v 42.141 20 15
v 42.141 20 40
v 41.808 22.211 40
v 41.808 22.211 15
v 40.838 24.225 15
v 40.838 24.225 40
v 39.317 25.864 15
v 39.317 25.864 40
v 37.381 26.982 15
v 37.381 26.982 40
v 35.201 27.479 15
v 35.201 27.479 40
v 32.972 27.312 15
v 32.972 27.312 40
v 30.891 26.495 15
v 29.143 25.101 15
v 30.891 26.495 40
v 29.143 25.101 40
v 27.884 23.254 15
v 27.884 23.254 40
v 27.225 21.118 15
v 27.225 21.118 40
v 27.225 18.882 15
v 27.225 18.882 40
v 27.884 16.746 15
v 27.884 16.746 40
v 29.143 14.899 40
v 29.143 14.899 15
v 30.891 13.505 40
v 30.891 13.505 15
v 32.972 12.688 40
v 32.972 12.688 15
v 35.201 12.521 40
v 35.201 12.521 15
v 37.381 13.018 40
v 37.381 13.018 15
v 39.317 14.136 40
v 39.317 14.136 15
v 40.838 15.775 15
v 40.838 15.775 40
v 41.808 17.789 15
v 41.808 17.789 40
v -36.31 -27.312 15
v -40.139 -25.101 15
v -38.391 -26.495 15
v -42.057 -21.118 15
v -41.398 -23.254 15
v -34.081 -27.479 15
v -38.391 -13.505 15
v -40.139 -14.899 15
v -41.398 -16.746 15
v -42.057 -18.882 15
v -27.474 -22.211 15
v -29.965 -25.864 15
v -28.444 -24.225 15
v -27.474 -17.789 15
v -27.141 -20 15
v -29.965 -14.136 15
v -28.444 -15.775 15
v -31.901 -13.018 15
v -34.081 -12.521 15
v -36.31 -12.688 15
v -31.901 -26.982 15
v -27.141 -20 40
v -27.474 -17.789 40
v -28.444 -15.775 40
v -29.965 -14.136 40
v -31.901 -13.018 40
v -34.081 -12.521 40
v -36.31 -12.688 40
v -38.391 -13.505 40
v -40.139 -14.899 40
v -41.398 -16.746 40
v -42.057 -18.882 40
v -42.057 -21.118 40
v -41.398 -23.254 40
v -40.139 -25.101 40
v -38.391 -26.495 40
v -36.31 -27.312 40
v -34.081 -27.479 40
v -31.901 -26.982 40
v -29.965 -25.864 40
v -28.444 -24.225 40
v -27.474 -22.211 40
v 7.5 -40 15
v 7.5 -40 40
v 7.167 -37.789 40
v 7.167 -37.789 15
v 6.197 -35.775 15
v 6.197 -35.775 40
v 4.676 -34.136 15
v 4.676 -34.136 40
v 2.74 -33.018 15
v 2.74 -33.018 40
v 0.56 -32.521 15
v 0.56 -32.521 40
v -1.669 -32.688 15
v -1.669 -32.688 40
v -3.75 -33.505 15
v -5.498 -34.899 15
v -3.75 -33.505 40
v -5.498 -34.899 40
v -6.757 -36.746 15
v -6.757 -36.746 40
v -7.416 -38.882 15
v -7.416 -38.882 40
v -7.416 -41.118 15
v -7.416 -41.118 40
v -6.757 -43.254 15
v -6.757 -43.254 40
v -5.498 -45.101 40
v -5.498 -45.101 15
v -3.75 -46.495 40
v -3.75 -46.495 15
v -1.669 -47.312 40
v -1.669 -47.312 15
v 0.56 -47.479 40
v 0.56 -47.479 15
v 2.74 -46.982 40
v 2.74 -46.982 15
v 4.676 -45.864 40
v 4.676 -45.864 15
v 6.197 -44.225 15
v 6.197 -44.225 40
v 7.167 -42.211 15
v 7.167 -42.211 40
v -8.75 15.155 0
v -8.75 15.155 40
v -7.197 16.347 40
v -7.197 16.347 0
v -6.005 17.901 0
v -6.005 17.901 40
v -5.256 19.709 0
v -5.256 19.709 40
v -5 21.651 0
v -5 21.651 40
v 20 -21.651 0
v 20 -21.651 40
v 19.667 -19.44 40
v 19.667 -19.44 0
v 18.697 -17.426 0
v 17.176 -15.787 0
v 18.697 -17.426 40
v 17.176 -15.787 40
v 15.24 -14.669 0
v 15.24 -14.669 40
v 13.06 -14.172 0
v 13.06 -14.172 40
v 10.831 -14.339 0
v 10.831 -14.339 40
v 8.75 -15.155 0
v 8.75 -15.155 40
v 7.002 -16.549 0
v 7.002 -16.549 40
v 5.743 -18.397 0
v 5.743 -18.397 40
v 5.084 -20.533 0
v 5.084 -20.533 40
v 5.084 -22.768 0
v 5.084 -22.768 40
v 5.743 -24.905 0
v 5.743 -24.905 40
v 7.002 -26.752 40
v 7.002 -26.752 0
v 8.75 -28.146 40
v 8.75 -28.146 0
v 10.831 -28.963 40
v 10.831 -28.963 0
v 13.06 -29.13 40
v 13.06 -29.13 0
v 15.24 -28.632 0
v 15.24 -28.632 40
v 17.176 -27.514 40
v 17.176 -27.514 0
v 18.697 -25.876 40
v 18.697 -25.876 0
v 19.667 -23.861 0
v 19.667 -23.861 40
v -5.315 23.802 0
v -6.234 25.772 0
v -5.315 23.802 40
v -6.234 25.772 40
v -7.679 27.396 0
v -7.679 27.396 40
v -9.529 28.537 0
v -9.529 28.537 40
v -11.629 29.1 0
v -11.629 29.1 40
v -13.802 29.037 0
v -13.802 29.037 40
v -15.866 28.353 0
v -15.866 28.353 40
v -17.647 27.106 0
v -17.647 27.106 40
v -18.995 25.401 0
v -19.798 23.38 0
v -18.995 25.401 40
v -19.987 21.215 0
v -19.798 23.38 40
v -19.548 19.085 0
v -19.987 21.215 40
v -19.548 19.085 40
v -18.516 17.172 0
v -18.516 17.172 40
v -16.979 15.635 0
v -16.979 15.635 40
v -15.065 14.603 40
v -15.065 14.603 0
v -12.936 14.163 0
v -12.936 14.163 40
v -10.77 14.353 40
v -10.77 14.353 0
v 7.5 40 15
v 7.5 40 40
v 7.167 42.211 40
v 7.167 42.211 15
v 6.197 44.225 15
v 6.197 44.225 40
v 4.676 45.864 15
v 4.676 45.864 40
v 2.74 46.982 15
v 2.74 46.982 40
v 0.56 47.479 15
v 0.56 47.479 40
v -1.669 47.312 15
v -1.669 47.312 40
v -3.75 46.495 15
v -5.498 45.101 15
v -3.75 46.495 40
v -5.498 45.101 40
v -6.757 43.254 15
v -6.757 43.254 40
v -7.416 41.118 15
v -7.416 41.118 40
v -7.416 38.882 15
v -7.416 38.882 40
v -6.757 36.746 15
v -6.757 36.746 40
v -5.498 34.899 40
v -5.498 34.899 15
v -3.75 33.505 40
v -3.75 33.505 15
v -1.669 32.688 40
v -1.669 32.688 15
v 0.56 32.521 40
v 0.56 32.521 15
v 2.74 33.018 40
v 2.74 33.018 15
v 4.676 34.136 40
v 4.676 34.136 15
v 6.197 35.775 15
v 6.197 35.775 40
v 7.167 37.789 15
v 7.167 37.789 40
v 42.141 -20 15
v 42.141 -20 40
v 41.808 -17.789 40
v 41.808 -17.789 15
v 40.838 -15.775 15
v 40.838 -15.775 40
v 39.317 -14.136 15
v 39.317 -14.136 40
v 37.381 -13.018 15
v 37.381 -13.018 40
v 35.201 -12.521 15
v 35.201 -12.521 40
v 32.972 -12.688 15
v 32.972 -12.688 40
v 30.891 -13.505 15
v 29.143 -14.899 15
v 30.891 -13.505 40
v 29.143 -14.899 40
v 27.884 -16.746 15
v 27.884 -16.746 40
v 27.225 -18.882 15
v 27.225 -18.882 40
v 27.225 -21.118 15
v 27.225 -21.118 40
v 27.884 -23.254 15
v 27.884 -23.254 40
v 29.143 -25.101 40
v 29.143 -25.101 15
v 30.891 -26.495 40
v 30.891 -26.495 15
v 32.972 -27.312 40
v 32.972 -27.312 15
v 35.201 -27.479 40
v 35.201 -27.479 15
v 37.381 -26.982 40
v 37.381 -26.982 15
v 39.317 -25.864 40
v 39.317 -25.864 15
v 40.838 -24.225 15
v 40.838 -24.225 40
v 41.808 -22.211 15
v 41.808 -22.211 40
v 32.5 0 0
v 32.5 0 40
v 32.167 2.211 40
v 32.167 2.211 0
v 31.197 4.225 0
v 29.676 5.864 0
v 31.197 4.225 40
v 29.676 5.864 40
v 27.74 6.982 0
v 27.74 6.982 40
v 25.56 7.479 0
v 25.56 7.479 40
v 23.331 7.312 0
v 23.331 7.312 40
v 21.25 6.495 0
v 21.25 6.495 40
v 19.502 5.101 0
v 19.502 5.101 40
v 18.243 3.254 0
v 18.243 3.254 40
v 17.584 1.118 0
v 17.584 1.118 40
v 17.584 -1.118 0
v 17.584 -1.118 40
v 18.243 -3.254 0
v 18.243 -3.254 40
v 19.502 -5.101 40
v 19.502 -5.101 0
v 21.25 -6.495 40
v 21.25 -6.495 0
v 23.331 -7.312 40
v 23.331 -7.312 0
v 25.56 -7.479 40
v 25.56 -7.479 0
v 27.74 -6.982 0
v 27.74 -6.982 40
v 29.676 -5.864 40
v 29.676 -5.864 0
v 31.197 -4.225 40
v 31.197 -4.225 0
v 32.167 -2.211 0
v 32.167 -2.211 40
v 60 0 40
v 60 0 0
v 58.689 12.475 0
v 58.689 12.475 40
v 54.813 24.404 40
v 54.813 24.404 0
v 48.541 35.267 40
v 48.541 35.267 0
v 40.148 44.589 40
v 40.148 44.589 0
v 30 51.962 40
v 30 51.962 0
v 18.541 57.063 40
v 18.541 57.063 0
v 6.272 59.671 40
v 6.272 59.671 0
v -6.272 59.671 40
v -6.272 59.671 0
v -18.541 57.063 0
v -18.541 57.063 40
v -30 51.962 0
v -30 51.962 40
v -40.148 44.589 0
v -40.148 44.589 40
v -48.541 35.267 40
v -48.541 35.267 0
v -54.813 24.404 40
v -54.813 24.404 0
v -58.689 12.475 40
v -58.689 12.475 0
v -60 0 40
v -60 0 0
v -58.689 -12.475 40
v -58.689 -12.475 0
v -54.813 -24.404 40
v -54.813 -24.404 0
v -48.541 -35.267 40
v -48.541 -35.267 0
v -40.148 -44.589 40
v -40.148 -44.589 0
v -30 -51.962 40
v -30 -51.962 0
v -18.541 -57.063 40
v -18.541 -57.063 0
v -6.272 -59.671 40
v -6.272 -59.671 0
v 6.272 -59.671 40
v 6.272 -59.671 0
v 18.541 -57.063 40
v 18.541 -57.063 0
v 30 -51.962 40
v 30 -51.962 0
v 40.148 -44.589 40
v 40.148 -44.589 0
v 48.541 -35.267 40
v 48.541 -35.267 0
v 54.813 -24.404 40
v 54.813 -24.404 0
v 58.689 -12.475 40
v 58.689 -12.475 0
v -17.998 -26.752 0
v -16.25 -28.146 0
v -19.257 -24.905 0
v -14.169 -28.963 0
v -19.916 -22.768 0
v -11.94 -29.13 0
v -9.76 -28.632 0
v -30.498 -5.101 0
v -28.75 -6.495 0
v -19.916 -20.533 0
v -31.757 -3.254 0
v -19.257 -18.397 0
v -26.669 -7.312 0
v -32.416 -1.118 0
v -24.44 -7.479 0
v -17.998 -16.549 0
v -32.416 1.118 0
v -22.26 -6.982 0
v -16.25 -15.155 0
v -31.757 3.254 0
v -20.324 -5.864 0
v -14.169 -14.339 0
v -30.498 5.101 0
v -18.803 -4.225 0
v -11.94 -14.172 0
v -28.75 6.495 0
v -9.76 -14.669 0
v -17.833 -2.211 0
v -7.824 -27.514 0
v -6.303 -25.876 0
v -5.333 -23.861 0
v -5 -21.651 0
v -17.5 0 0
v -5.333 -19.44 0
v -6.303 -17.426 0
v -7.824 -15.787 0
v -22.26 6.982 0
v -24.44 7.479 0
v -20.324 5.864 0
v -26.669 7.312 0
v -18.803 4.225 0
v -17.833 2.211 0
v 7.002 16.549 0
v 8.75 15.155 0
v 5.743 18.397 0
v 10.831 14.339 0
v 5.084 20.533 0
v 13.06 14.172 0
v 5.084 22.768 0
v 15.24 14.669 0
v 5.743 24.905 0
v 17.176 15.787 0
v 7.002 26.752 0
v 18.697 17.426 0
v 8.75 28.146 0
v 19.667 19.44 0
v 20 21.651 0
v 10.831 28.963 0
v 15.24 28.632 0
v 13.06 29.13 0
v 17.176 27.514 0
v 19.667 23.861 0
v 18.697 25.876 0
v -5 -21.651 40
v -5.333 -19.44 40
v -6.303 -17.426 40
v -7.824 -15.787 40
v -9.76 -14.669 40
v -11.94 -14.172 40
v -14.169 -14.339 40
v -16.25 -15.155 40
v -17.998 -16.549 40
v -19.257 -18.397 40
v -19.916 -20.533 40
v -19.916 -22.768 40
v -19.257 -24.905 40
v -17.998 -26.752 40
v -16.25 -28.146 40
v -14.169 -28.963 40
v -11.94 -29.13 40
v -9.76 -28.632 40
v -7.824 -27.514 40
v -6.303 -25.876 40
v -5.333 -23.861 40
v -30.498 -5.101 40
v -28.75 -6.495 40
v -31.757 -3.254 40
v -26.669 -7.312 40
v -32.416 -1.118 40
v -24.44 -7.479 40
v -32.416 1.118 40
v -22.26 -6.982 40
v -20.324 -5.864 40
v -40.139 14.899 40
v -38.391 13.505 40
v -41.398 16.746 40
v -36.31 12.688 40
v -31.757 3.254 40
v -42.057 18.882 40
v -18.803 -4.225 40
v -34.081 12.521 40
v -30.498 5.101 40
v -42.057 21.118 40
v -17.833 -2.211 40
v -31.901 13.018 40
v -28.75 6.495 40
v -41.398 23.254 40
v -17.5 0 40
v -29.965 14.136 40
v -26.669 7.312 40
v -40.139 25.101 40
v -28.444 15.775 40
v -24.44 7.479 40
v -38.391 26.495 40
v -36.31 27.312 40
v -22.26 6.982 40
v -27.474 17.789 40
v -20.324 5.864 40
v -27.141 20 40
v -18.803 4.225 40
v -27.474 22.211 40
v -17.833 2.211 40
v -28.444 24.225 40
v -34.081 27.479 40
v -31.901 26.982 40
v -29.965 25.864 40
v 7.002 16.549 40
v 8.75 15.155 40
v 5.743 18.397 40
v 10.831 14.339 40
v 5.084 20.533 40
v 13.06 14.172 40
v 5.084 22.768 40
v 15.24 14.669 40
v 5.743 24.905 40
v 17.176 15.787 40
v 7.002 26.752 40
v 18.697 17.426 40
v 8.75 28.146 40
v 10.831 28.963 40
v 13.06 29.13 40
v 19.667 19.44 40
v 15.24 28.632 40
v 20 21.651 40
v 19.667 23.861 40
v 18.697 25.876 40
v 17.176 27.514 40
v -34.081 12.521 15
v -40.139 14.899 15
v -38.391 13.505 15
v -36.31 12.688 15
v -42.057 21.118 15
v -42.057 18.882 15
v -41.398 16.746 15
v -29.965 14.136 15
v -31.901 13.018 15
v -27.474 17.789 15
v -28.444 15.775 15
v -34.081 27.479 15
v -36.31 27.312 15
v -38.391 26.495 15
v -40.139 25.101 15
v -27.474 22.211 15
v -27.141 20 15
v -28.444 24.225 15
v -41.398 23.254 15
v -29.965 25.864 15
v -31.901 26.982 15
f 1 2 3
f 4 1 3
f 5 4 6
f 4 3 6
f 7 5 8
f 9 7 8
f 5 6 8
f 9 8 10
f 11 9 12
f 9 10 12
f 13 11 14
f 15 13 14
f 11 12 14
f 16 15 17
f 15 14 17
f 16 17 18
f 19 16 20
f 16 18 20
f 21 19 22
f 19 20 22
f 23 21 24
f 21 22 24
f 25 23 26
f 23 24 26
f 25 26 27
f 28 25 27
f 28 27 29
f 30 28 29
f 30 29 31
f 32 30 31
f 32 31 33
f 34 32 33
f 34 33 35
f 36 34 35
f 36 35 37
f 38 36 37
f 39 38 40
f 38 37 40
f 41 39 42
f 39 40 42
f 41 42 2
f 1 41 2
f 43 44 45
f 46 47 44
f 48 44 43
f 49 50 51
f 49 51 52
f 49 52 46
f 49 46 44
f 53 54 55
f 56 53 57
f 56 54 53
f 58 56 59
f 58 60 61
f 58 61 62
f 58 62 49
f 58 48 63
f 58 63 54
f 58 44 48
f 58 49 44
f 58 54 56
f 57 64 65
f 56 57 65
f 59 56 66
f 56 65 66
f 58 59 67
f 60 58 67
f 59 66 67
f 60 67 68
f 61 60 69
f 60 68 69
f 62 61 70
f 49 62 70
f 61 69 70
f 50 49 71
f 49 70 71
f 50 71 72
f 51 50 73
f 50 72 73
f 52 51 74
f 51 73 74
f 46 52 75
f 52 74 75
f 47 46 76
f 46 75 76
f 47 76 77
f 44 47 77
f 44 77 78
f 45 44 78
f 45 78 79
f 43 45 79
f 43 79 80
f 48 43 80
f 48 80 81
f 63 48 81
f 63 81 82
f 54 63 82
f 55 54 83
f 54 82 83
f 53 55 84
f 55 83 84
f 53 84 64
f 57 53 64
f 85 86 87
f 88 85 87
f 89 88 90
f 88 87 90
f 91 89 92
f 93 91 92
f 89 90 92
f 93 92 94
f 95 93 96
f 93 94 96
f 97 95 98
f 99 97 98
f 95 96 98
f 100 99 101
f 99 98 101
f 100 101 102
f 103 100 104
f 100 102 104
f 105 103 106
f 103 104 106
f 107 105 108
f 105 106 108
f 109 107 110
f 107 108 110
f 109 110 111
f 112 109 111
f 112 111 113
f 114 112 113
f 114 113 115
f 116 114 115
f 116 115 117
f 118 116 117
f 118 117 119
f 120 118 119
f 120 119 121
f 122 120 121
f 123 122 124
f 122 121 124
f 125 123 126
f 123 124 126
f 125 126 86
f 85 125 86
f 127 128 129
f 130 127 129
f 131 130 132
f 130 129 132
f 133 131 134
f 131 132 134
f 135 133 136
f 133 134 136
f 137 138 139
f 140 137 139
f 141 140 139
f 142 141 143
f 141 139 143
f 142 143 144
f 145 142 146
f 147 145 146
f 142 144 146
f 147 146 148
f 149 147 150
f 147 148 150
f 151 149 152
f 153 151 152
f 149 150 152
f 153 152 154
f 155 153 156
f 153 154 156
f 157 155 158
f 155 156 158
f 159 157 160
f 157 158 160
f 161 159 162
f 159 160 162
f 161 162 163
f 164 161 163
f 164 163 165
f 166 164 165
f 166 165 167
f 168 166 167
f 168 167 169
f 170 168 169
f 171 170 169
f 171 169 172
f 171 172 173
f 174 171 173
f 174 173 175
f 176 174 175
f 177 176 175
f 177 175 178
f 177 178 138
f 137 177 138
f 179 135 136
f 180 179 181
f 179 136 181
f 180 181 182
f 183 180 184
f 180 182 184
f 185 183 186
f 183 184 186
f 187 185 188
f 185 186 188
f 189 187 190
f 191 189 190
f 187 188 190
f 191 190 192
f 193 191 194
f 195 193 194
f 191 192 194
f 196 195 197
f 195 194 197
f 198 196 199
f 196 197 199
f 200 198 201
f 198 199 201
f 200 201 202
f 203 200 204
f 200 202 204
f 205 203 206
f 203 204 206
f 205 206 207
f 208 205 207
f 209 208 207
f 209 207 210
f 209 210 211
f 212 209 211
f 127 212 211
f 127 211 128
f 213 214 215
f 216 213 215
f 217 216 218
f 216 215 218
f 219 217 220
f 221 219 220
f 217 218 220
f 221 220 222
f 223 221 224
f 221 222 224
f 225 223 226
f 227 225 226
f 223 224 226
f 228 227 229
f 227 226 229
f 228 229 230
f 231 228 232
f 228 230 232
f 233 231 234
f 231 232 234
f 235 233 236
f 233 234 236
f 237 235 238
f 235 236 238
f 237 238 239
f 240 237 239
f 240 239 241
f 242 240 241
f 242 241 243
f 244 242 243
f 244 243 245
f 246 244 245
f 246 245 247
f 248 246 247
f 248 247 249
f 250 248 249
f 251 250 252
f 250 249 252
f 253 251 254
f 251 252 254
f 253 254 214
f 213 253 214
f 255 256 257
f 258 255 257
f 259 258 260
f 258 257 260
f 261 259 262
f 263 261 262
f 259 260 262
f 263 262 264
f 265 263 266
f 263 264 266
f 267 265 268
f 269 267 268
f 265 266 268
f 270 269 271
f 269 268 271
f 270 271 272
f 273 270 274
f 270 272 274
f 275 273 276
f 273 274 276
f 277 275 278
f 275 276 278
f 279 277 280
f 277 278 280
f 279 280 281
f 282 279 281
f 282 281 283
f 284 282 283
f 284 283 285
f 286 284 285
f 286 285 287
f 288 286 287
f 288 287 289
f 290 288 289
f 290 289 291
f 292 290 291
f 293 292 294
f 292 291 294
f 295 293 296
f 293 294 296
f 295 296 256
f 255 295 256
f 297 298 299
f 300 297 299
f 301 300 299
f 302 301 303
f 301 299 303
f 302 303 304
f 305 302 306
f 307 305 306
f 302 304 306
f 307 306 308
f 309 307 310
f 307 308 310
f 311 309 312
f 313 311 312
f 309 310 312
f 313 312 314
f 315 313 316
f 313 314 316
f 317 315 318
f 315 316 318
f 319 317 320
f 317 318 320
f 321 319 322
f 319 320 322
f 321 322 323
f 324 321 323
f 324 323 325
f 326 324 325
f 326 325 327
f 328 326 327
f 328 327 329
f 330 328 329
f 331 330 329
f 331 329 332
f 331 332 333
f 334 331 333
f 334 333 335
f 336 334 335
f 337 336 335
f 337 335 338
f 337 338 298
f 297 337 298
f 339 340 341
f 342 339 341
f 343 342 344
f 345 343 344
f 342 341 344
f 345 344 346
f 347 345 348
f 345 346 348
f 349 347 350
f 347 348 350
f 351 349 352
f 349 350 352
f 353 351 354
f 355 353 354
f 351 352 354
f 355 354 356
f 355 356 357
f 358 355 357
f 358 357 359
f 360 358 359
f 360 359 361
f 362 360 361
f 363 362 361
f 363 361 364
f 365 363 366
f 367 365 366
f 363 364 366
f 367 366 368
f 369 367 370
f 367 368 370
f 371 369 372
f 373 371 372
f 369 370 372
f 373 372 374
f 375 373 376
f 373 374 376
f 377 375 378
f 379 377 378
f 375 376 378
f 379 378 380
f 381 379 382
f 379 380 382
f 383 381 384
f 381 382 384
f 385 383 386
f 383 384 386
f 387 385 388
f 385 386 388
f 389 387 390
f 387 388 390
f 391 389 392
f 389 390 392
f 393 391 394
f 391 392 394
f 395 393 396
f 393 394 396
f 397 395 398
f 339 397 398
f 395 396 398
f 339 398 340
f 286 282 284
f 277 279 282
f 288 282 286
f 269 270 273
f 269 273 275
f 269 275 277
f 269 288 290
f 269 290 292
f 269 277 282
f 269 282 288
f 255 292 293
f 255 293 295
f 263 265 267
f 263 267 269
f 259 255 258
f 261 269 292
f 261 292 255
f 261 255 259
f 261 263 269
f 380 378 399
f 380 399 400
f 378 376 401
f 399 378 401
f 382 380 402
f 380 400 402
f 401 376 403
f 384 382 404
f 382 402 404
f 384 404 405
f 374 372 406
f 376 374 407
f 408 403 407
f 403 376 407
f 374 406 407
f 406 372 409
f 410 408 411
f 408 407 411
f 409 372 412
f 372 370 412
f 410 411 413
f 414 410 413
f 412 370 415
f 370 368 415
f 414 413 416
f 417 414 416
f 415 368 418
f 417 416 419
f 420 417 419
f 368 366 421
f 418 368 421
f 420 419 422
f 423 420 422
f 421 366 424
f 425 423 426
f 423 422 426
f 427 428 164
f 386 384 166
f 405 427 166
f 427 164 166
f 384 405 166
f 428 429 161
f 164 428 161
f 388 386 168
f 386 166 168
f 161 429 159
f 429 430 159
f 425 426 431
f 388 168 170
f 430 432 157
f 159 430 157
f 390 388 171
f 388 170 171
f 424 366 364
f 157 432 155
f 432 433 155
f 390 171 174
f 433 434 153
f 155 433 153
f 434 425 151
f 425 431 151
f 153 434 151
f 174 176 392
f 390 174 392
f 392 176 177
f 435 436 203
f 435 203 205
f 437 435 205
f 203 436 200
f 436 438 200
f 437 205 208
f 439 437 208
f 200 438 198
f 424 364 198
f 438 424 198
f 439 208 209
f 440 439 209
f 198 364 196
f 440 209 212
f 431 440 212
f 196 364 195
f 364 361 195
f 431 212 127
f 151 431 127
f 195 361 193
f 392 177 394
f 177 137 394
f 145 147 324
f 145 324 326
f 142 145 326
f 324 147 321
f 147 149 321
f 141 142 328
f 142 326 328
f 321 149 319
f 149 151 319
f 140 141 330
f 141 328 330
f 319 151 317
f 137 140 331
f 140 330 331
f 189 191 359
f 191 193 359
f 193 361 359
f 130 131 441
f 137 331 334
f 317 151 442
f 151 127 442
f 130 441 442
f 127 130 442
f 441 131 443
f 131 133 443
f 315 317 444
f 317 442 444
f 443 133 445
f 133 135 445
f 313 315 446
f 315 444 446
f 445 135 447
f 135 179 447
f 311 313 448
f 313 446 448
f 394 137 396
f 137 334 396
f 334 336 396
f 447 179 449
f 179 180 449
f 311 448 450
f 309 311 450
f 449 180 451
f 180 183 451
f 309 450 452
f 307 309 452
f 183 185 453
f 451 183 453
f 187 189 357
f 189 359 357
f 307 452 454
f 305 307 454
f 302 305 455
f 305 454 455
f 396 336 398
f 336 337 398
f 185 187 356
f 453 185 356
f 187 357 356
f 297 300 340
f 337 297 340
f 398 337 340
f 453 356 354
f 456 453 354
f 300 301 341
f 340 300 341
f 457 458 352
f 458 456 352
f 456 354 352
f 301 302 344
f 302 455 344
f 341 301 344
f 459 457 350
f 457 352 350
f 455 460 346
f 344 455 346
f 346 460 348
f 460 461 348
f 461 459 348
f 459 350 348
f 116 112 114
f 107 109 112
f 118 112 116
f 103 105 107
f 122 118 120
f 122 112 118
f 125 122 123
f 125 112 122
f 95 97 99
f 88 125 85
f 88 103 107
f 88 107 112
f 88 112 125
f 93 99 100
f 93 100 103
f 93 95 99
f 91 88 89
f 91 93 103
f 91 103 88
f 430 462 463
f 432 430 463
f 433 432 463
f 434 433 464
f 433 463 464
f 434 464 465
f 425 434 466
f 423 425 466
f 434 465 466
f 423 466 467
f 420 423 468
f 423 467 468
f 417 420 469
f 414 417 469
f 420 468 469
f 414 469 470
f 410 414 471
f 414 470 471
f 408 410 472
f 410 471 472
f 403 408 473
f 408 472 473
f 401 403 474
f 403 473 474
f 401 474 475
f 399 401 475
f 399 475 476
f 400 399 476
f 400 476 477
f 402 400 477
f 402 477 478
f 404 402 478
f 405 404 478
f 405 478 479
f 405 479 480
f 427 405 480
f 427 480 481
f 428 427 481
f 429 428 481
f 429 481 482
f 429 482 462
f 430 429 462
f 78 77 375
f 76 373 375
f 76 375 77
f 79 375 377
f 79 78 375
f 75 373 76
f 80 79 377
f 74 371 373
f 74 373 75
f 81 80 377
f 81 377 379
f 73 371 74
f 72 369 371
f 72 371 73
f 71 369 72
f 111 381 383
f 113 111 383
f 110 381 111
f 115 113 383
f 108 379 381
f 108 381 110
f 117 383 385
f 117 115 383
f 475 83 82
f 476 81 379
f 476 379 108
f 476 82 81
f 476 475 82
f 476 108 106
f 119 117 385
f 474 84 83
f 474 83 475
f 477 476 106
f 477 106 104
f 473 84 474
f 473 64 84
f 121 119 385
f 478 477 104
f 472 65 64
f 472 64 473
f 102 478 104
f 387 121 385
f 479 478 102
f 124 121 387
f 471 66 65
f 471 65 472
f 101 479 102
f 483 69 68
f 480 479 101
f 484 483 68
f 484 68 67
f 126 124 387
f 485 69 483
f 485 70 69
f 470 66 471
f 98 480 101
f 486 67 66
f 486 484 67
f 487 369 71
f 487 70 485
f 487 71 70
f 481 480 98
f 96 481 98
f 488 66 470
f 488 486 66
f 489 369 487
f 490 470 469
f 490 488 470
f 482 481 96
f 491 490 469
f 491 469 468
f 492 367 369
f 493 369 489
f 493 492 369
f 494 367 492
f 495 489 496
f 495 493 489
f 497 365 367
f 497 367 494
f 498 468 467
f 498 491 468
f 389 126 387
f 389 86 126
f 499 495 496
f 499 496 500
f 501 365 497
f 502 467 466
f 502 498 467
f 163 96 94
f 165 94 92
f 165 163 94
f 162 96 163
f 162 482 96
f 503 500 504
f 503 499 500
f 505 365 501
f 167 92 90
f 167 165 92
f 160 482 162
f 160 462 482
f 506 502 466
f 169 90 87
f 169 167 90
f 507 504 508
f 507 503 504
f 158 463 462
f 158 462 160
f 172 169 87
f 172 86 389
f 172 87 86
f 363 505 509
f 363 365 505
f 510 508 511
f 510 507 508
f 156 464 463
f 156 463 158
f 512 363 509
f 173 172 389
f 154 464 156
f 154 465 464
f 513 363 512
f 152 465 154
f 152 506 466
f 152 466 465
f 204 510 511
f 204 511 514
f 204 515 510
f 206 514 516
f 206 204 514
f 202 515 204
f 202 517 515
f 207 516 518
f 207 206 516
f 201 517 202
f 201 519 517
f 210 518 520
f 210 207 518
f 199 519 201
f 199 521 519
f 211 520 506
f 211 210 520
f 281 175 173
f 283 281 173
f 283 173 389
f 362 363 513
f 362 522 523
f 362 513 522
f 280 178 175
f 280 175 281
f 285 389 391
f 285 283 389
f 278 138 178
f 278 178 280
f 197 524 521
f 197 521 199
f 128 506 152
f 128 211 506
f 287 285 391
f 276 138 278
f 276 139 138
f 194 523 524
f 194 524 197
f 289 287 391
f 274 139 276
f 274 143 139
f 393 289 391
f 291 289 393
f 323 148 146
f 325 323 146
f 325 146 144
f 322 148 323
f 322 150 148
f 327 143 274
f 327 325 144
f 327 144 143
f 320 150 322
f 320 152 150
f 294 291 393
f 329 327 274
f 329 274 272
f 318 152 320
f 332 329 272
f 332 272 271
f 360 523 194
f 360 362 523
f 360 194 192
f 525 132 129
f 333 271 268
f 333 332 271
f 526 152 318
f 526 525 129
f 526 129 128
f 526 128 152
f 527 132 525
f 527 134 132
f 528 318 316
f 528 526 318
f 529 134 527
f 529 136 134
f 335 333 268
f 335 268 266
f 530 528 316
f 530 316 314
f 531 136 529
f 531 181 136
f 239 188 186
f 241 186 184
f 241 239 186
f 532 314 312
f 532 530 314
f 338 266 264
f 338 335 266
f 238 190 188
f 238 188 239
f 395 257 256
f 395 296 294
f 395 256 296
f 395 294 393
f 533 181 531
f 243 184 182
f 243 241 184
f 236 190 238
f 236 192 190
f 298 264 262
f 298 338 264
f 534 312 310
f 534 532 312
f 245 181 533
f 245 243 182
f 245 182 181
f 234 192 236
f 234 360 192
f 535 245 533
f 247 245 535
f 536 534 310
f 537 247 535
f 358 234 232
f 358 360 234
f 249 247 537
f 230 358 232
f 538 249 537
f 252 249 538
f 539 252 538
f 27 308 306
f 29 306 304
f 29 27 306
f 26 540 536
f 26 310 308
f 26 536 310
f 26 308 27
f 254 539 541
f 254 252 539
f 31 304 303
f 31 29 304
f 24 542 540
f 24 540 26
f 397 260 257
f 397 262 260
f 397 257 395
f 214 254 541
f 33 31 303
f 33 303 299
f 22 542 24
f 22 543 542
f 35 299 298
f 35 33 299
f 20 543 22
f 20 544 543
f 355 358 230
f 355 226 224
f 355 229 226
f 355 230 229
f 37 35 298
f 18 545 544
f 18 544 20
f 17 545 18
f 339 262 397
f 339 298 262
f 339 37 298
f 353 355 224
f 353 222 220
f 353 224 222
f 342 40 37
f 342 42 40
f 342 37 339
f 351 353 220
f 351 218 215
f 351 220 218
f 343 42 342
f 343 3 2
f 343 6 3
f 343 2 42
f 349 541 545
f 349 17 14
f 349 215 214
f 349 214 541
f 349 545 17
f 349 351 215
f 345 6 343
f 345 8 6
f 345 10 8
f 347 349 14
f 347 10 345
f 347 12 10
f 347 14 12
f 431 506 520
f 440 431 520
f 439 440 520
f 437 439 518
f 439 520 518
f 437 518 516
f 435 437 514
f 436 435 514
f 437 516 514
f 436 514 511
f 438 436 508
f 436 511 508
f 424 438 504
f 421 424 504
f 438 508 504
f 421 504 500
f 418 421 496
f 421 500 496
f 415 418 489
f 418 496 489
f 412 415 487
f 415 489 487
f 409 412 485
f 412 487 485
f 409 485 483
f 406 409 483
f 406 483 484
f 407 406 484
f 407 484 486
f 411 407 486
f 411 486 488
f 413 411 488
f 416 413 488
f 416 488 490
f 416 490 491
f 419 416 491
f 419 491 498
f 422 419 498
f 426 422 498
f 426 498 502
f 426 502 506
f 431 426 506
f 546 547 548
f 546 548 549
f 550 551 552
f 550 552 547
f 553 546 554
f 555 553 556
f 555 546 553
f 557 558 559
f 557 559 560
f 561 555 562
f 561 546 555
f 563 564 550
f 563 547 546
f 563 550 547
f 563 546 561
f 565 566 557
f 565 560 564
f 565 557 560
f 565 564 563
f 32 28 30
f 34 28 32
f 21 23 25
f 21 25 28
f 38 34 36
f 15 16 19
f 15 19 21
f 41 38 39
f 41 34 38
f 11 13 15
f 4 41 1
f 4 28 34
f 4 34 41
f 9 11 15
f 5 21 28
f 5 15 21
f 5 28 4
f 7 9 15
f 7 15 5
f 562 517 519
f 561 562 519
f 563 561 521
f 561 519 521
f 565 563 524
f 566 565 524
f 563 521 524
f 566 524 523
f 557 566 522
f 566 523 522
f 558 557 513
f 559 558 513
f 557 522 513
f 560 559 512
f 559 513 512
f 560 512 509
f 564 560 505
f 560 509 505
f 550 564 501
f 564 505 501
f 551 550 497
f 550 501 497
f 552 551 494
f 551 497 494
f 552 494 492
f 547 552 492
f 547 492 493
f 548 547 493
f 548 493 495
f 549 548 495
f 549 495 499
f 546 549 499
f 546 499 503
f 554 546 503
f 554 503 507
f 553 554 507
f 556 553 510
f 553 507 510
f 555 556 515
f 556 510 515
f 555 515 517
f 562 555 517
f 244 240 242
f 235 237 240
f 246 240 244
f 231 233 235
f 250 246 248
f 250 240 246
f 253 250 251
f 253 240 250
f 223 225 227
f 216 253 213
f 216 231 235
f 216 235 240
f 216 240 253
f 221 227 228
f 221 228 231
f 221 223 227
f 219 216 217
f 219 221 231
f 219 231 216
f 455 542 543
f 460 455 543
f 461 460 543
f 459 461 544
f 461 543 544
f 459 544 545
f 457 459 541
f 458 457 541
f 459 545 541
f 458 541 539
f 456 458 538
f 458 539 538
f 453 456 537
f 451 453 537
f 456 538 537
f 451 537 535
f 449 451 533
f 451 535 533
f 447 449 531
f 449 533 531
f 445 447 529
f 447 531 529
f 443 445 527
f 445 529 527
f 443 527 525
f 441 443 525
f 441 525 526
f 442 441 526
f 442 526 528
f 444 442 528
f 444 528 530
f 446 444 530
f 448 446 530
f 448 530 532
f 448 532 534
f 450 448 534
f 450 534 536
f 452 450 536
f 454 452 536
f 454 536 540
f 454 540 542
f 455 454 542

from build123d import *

# Parameters (mm, degrees)
F0_R     = 60
F1_DEPTH = 40
F2_R     = 7.5
F3_DEPTH = 25
F4_R     = 7.5
F5_DEPTH = 40.001


# Not quite as in the source:
# - a feature names something its author has since deleted; it is built from what else it names


with BuildPart() as f1:
    # F0 (on Top) → F1 (new body)
    with BuildSketch(Plane.XY):
        Circle(F0_R)
    extrude(amount=F1_DEPTH)

    # F2 (on face) → F3 (cut)
    with BuildSketch(Plane.XY.offset(40)):
        with Locations((-34.6410161514, 20)):
            Circle(F2_R)
        with Locations((0, 40)):
            Circle(F2_R)
        with Locations((34.6410161514, 20)):
            Circle(F2_R)
        with Locations((34.6410161514, -20)):
            Circle(F2_R)
        with Locations((0, -40)):
            Circle(F2_R)
        with Locations((-34.6410161514, -20)):
            Circle(F2_R)
    extrude(amount=-F3_DEPTH, mode=Mode.SUBTRACT)

    # F4 (on face) → F5 (cut, through all)
    with BuildSketch(Plane.XY.offset(40)):
        with Locations((-25, 0)):
            Circle(F4_R)
        with Locations((-12.5, -21.6506350946)):
            Circle(F4_R)
        with Locations((12.5, -21.6506350946)):
            Circle(F4_R)
        with Locations((25, 0)):
            Circle(F4_R)
        with Locations((12.5, 21.6506350946)):
            Circle(F4_R)
        with BuildLine():
            ThreePointArc((-8.75, 15.1554445662), (-6.0048094716, 17.9006350946), (-5, 21.6506350946))
            ThreePointArc((-5, 21.6506350946), (-18.9951905284, 25.4006350946), (-8.75, 15.1554445662))
        make_face()
    extrude(amount=-F5_DEPTH, mode=Mode.SUBTRACT)


solid = f1.part
